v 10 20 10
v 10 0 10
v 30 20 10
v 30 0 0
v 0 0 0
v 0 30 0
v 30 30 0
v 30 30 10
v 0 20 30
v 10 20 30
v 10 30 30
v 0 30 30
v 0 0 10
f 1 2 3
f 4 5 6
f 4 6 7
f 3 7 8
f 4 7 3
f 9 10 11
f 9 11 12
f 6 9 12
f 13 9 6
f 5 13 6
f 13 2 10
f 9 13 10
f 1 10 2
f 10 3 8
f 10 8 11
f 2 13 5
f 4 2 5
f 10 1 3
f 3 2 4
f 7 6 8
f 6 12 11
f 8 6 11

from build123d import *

# Parameters (mm, degrees)
F1_DEPTH = 30
F2_DEPTH = 20
F4_DEPTH = 10.001
F7_DEPTH = 24.4958974278


with BuildPart() as f1:
    # F0 (on Front) → F1 (new body)
    with BuildSketch(Plane.XZ):
        Polygon((0, 30), (0, 0), (30, 0), (30, 10), (10, 10), (10, 30), align=None)
        Polygon((10, 10), (30, 10), (10, 30), align=None)
    extrude(amount=-F1_DEPTH)

    # F0 (on Front) → F2 (cut)
    with BuildSketch(Plane.XZ):
        Polygon((10, 10), (30, 10), (10, 30), align=None)
    extrude(amount=-F2_DEPTH, mode=Mode.SUBTRACT)

    # F3 (on face) → F4 (cut, through all)
    with BuildSketch(Plane.YZ.offset(10)):
        Polygon((0, 10), (20, 30), (0, 30), align=None)
    extrude(amount=-F4_DEPTH, mode=Mode.SUBTRACT)

    # F6 (on 3pt) → F7 (cut, through all)
    with BuildSketch(Plane(origin=(5, -5, 10), x_dir=(0.9128709292, 0.1825741858, -0.3651483717), z_dir=(-0.4082482905, 0.4082482905, -0.8164965809))):
        Polygon((5.4772255751, -4.472135955), (27.3861278753, -22.360679775), (27.3861278753, 0), align=None)
    extrude(amount=-F7_DEPTH, mode=Mode.SUBTRACT)


solid = f1.part
